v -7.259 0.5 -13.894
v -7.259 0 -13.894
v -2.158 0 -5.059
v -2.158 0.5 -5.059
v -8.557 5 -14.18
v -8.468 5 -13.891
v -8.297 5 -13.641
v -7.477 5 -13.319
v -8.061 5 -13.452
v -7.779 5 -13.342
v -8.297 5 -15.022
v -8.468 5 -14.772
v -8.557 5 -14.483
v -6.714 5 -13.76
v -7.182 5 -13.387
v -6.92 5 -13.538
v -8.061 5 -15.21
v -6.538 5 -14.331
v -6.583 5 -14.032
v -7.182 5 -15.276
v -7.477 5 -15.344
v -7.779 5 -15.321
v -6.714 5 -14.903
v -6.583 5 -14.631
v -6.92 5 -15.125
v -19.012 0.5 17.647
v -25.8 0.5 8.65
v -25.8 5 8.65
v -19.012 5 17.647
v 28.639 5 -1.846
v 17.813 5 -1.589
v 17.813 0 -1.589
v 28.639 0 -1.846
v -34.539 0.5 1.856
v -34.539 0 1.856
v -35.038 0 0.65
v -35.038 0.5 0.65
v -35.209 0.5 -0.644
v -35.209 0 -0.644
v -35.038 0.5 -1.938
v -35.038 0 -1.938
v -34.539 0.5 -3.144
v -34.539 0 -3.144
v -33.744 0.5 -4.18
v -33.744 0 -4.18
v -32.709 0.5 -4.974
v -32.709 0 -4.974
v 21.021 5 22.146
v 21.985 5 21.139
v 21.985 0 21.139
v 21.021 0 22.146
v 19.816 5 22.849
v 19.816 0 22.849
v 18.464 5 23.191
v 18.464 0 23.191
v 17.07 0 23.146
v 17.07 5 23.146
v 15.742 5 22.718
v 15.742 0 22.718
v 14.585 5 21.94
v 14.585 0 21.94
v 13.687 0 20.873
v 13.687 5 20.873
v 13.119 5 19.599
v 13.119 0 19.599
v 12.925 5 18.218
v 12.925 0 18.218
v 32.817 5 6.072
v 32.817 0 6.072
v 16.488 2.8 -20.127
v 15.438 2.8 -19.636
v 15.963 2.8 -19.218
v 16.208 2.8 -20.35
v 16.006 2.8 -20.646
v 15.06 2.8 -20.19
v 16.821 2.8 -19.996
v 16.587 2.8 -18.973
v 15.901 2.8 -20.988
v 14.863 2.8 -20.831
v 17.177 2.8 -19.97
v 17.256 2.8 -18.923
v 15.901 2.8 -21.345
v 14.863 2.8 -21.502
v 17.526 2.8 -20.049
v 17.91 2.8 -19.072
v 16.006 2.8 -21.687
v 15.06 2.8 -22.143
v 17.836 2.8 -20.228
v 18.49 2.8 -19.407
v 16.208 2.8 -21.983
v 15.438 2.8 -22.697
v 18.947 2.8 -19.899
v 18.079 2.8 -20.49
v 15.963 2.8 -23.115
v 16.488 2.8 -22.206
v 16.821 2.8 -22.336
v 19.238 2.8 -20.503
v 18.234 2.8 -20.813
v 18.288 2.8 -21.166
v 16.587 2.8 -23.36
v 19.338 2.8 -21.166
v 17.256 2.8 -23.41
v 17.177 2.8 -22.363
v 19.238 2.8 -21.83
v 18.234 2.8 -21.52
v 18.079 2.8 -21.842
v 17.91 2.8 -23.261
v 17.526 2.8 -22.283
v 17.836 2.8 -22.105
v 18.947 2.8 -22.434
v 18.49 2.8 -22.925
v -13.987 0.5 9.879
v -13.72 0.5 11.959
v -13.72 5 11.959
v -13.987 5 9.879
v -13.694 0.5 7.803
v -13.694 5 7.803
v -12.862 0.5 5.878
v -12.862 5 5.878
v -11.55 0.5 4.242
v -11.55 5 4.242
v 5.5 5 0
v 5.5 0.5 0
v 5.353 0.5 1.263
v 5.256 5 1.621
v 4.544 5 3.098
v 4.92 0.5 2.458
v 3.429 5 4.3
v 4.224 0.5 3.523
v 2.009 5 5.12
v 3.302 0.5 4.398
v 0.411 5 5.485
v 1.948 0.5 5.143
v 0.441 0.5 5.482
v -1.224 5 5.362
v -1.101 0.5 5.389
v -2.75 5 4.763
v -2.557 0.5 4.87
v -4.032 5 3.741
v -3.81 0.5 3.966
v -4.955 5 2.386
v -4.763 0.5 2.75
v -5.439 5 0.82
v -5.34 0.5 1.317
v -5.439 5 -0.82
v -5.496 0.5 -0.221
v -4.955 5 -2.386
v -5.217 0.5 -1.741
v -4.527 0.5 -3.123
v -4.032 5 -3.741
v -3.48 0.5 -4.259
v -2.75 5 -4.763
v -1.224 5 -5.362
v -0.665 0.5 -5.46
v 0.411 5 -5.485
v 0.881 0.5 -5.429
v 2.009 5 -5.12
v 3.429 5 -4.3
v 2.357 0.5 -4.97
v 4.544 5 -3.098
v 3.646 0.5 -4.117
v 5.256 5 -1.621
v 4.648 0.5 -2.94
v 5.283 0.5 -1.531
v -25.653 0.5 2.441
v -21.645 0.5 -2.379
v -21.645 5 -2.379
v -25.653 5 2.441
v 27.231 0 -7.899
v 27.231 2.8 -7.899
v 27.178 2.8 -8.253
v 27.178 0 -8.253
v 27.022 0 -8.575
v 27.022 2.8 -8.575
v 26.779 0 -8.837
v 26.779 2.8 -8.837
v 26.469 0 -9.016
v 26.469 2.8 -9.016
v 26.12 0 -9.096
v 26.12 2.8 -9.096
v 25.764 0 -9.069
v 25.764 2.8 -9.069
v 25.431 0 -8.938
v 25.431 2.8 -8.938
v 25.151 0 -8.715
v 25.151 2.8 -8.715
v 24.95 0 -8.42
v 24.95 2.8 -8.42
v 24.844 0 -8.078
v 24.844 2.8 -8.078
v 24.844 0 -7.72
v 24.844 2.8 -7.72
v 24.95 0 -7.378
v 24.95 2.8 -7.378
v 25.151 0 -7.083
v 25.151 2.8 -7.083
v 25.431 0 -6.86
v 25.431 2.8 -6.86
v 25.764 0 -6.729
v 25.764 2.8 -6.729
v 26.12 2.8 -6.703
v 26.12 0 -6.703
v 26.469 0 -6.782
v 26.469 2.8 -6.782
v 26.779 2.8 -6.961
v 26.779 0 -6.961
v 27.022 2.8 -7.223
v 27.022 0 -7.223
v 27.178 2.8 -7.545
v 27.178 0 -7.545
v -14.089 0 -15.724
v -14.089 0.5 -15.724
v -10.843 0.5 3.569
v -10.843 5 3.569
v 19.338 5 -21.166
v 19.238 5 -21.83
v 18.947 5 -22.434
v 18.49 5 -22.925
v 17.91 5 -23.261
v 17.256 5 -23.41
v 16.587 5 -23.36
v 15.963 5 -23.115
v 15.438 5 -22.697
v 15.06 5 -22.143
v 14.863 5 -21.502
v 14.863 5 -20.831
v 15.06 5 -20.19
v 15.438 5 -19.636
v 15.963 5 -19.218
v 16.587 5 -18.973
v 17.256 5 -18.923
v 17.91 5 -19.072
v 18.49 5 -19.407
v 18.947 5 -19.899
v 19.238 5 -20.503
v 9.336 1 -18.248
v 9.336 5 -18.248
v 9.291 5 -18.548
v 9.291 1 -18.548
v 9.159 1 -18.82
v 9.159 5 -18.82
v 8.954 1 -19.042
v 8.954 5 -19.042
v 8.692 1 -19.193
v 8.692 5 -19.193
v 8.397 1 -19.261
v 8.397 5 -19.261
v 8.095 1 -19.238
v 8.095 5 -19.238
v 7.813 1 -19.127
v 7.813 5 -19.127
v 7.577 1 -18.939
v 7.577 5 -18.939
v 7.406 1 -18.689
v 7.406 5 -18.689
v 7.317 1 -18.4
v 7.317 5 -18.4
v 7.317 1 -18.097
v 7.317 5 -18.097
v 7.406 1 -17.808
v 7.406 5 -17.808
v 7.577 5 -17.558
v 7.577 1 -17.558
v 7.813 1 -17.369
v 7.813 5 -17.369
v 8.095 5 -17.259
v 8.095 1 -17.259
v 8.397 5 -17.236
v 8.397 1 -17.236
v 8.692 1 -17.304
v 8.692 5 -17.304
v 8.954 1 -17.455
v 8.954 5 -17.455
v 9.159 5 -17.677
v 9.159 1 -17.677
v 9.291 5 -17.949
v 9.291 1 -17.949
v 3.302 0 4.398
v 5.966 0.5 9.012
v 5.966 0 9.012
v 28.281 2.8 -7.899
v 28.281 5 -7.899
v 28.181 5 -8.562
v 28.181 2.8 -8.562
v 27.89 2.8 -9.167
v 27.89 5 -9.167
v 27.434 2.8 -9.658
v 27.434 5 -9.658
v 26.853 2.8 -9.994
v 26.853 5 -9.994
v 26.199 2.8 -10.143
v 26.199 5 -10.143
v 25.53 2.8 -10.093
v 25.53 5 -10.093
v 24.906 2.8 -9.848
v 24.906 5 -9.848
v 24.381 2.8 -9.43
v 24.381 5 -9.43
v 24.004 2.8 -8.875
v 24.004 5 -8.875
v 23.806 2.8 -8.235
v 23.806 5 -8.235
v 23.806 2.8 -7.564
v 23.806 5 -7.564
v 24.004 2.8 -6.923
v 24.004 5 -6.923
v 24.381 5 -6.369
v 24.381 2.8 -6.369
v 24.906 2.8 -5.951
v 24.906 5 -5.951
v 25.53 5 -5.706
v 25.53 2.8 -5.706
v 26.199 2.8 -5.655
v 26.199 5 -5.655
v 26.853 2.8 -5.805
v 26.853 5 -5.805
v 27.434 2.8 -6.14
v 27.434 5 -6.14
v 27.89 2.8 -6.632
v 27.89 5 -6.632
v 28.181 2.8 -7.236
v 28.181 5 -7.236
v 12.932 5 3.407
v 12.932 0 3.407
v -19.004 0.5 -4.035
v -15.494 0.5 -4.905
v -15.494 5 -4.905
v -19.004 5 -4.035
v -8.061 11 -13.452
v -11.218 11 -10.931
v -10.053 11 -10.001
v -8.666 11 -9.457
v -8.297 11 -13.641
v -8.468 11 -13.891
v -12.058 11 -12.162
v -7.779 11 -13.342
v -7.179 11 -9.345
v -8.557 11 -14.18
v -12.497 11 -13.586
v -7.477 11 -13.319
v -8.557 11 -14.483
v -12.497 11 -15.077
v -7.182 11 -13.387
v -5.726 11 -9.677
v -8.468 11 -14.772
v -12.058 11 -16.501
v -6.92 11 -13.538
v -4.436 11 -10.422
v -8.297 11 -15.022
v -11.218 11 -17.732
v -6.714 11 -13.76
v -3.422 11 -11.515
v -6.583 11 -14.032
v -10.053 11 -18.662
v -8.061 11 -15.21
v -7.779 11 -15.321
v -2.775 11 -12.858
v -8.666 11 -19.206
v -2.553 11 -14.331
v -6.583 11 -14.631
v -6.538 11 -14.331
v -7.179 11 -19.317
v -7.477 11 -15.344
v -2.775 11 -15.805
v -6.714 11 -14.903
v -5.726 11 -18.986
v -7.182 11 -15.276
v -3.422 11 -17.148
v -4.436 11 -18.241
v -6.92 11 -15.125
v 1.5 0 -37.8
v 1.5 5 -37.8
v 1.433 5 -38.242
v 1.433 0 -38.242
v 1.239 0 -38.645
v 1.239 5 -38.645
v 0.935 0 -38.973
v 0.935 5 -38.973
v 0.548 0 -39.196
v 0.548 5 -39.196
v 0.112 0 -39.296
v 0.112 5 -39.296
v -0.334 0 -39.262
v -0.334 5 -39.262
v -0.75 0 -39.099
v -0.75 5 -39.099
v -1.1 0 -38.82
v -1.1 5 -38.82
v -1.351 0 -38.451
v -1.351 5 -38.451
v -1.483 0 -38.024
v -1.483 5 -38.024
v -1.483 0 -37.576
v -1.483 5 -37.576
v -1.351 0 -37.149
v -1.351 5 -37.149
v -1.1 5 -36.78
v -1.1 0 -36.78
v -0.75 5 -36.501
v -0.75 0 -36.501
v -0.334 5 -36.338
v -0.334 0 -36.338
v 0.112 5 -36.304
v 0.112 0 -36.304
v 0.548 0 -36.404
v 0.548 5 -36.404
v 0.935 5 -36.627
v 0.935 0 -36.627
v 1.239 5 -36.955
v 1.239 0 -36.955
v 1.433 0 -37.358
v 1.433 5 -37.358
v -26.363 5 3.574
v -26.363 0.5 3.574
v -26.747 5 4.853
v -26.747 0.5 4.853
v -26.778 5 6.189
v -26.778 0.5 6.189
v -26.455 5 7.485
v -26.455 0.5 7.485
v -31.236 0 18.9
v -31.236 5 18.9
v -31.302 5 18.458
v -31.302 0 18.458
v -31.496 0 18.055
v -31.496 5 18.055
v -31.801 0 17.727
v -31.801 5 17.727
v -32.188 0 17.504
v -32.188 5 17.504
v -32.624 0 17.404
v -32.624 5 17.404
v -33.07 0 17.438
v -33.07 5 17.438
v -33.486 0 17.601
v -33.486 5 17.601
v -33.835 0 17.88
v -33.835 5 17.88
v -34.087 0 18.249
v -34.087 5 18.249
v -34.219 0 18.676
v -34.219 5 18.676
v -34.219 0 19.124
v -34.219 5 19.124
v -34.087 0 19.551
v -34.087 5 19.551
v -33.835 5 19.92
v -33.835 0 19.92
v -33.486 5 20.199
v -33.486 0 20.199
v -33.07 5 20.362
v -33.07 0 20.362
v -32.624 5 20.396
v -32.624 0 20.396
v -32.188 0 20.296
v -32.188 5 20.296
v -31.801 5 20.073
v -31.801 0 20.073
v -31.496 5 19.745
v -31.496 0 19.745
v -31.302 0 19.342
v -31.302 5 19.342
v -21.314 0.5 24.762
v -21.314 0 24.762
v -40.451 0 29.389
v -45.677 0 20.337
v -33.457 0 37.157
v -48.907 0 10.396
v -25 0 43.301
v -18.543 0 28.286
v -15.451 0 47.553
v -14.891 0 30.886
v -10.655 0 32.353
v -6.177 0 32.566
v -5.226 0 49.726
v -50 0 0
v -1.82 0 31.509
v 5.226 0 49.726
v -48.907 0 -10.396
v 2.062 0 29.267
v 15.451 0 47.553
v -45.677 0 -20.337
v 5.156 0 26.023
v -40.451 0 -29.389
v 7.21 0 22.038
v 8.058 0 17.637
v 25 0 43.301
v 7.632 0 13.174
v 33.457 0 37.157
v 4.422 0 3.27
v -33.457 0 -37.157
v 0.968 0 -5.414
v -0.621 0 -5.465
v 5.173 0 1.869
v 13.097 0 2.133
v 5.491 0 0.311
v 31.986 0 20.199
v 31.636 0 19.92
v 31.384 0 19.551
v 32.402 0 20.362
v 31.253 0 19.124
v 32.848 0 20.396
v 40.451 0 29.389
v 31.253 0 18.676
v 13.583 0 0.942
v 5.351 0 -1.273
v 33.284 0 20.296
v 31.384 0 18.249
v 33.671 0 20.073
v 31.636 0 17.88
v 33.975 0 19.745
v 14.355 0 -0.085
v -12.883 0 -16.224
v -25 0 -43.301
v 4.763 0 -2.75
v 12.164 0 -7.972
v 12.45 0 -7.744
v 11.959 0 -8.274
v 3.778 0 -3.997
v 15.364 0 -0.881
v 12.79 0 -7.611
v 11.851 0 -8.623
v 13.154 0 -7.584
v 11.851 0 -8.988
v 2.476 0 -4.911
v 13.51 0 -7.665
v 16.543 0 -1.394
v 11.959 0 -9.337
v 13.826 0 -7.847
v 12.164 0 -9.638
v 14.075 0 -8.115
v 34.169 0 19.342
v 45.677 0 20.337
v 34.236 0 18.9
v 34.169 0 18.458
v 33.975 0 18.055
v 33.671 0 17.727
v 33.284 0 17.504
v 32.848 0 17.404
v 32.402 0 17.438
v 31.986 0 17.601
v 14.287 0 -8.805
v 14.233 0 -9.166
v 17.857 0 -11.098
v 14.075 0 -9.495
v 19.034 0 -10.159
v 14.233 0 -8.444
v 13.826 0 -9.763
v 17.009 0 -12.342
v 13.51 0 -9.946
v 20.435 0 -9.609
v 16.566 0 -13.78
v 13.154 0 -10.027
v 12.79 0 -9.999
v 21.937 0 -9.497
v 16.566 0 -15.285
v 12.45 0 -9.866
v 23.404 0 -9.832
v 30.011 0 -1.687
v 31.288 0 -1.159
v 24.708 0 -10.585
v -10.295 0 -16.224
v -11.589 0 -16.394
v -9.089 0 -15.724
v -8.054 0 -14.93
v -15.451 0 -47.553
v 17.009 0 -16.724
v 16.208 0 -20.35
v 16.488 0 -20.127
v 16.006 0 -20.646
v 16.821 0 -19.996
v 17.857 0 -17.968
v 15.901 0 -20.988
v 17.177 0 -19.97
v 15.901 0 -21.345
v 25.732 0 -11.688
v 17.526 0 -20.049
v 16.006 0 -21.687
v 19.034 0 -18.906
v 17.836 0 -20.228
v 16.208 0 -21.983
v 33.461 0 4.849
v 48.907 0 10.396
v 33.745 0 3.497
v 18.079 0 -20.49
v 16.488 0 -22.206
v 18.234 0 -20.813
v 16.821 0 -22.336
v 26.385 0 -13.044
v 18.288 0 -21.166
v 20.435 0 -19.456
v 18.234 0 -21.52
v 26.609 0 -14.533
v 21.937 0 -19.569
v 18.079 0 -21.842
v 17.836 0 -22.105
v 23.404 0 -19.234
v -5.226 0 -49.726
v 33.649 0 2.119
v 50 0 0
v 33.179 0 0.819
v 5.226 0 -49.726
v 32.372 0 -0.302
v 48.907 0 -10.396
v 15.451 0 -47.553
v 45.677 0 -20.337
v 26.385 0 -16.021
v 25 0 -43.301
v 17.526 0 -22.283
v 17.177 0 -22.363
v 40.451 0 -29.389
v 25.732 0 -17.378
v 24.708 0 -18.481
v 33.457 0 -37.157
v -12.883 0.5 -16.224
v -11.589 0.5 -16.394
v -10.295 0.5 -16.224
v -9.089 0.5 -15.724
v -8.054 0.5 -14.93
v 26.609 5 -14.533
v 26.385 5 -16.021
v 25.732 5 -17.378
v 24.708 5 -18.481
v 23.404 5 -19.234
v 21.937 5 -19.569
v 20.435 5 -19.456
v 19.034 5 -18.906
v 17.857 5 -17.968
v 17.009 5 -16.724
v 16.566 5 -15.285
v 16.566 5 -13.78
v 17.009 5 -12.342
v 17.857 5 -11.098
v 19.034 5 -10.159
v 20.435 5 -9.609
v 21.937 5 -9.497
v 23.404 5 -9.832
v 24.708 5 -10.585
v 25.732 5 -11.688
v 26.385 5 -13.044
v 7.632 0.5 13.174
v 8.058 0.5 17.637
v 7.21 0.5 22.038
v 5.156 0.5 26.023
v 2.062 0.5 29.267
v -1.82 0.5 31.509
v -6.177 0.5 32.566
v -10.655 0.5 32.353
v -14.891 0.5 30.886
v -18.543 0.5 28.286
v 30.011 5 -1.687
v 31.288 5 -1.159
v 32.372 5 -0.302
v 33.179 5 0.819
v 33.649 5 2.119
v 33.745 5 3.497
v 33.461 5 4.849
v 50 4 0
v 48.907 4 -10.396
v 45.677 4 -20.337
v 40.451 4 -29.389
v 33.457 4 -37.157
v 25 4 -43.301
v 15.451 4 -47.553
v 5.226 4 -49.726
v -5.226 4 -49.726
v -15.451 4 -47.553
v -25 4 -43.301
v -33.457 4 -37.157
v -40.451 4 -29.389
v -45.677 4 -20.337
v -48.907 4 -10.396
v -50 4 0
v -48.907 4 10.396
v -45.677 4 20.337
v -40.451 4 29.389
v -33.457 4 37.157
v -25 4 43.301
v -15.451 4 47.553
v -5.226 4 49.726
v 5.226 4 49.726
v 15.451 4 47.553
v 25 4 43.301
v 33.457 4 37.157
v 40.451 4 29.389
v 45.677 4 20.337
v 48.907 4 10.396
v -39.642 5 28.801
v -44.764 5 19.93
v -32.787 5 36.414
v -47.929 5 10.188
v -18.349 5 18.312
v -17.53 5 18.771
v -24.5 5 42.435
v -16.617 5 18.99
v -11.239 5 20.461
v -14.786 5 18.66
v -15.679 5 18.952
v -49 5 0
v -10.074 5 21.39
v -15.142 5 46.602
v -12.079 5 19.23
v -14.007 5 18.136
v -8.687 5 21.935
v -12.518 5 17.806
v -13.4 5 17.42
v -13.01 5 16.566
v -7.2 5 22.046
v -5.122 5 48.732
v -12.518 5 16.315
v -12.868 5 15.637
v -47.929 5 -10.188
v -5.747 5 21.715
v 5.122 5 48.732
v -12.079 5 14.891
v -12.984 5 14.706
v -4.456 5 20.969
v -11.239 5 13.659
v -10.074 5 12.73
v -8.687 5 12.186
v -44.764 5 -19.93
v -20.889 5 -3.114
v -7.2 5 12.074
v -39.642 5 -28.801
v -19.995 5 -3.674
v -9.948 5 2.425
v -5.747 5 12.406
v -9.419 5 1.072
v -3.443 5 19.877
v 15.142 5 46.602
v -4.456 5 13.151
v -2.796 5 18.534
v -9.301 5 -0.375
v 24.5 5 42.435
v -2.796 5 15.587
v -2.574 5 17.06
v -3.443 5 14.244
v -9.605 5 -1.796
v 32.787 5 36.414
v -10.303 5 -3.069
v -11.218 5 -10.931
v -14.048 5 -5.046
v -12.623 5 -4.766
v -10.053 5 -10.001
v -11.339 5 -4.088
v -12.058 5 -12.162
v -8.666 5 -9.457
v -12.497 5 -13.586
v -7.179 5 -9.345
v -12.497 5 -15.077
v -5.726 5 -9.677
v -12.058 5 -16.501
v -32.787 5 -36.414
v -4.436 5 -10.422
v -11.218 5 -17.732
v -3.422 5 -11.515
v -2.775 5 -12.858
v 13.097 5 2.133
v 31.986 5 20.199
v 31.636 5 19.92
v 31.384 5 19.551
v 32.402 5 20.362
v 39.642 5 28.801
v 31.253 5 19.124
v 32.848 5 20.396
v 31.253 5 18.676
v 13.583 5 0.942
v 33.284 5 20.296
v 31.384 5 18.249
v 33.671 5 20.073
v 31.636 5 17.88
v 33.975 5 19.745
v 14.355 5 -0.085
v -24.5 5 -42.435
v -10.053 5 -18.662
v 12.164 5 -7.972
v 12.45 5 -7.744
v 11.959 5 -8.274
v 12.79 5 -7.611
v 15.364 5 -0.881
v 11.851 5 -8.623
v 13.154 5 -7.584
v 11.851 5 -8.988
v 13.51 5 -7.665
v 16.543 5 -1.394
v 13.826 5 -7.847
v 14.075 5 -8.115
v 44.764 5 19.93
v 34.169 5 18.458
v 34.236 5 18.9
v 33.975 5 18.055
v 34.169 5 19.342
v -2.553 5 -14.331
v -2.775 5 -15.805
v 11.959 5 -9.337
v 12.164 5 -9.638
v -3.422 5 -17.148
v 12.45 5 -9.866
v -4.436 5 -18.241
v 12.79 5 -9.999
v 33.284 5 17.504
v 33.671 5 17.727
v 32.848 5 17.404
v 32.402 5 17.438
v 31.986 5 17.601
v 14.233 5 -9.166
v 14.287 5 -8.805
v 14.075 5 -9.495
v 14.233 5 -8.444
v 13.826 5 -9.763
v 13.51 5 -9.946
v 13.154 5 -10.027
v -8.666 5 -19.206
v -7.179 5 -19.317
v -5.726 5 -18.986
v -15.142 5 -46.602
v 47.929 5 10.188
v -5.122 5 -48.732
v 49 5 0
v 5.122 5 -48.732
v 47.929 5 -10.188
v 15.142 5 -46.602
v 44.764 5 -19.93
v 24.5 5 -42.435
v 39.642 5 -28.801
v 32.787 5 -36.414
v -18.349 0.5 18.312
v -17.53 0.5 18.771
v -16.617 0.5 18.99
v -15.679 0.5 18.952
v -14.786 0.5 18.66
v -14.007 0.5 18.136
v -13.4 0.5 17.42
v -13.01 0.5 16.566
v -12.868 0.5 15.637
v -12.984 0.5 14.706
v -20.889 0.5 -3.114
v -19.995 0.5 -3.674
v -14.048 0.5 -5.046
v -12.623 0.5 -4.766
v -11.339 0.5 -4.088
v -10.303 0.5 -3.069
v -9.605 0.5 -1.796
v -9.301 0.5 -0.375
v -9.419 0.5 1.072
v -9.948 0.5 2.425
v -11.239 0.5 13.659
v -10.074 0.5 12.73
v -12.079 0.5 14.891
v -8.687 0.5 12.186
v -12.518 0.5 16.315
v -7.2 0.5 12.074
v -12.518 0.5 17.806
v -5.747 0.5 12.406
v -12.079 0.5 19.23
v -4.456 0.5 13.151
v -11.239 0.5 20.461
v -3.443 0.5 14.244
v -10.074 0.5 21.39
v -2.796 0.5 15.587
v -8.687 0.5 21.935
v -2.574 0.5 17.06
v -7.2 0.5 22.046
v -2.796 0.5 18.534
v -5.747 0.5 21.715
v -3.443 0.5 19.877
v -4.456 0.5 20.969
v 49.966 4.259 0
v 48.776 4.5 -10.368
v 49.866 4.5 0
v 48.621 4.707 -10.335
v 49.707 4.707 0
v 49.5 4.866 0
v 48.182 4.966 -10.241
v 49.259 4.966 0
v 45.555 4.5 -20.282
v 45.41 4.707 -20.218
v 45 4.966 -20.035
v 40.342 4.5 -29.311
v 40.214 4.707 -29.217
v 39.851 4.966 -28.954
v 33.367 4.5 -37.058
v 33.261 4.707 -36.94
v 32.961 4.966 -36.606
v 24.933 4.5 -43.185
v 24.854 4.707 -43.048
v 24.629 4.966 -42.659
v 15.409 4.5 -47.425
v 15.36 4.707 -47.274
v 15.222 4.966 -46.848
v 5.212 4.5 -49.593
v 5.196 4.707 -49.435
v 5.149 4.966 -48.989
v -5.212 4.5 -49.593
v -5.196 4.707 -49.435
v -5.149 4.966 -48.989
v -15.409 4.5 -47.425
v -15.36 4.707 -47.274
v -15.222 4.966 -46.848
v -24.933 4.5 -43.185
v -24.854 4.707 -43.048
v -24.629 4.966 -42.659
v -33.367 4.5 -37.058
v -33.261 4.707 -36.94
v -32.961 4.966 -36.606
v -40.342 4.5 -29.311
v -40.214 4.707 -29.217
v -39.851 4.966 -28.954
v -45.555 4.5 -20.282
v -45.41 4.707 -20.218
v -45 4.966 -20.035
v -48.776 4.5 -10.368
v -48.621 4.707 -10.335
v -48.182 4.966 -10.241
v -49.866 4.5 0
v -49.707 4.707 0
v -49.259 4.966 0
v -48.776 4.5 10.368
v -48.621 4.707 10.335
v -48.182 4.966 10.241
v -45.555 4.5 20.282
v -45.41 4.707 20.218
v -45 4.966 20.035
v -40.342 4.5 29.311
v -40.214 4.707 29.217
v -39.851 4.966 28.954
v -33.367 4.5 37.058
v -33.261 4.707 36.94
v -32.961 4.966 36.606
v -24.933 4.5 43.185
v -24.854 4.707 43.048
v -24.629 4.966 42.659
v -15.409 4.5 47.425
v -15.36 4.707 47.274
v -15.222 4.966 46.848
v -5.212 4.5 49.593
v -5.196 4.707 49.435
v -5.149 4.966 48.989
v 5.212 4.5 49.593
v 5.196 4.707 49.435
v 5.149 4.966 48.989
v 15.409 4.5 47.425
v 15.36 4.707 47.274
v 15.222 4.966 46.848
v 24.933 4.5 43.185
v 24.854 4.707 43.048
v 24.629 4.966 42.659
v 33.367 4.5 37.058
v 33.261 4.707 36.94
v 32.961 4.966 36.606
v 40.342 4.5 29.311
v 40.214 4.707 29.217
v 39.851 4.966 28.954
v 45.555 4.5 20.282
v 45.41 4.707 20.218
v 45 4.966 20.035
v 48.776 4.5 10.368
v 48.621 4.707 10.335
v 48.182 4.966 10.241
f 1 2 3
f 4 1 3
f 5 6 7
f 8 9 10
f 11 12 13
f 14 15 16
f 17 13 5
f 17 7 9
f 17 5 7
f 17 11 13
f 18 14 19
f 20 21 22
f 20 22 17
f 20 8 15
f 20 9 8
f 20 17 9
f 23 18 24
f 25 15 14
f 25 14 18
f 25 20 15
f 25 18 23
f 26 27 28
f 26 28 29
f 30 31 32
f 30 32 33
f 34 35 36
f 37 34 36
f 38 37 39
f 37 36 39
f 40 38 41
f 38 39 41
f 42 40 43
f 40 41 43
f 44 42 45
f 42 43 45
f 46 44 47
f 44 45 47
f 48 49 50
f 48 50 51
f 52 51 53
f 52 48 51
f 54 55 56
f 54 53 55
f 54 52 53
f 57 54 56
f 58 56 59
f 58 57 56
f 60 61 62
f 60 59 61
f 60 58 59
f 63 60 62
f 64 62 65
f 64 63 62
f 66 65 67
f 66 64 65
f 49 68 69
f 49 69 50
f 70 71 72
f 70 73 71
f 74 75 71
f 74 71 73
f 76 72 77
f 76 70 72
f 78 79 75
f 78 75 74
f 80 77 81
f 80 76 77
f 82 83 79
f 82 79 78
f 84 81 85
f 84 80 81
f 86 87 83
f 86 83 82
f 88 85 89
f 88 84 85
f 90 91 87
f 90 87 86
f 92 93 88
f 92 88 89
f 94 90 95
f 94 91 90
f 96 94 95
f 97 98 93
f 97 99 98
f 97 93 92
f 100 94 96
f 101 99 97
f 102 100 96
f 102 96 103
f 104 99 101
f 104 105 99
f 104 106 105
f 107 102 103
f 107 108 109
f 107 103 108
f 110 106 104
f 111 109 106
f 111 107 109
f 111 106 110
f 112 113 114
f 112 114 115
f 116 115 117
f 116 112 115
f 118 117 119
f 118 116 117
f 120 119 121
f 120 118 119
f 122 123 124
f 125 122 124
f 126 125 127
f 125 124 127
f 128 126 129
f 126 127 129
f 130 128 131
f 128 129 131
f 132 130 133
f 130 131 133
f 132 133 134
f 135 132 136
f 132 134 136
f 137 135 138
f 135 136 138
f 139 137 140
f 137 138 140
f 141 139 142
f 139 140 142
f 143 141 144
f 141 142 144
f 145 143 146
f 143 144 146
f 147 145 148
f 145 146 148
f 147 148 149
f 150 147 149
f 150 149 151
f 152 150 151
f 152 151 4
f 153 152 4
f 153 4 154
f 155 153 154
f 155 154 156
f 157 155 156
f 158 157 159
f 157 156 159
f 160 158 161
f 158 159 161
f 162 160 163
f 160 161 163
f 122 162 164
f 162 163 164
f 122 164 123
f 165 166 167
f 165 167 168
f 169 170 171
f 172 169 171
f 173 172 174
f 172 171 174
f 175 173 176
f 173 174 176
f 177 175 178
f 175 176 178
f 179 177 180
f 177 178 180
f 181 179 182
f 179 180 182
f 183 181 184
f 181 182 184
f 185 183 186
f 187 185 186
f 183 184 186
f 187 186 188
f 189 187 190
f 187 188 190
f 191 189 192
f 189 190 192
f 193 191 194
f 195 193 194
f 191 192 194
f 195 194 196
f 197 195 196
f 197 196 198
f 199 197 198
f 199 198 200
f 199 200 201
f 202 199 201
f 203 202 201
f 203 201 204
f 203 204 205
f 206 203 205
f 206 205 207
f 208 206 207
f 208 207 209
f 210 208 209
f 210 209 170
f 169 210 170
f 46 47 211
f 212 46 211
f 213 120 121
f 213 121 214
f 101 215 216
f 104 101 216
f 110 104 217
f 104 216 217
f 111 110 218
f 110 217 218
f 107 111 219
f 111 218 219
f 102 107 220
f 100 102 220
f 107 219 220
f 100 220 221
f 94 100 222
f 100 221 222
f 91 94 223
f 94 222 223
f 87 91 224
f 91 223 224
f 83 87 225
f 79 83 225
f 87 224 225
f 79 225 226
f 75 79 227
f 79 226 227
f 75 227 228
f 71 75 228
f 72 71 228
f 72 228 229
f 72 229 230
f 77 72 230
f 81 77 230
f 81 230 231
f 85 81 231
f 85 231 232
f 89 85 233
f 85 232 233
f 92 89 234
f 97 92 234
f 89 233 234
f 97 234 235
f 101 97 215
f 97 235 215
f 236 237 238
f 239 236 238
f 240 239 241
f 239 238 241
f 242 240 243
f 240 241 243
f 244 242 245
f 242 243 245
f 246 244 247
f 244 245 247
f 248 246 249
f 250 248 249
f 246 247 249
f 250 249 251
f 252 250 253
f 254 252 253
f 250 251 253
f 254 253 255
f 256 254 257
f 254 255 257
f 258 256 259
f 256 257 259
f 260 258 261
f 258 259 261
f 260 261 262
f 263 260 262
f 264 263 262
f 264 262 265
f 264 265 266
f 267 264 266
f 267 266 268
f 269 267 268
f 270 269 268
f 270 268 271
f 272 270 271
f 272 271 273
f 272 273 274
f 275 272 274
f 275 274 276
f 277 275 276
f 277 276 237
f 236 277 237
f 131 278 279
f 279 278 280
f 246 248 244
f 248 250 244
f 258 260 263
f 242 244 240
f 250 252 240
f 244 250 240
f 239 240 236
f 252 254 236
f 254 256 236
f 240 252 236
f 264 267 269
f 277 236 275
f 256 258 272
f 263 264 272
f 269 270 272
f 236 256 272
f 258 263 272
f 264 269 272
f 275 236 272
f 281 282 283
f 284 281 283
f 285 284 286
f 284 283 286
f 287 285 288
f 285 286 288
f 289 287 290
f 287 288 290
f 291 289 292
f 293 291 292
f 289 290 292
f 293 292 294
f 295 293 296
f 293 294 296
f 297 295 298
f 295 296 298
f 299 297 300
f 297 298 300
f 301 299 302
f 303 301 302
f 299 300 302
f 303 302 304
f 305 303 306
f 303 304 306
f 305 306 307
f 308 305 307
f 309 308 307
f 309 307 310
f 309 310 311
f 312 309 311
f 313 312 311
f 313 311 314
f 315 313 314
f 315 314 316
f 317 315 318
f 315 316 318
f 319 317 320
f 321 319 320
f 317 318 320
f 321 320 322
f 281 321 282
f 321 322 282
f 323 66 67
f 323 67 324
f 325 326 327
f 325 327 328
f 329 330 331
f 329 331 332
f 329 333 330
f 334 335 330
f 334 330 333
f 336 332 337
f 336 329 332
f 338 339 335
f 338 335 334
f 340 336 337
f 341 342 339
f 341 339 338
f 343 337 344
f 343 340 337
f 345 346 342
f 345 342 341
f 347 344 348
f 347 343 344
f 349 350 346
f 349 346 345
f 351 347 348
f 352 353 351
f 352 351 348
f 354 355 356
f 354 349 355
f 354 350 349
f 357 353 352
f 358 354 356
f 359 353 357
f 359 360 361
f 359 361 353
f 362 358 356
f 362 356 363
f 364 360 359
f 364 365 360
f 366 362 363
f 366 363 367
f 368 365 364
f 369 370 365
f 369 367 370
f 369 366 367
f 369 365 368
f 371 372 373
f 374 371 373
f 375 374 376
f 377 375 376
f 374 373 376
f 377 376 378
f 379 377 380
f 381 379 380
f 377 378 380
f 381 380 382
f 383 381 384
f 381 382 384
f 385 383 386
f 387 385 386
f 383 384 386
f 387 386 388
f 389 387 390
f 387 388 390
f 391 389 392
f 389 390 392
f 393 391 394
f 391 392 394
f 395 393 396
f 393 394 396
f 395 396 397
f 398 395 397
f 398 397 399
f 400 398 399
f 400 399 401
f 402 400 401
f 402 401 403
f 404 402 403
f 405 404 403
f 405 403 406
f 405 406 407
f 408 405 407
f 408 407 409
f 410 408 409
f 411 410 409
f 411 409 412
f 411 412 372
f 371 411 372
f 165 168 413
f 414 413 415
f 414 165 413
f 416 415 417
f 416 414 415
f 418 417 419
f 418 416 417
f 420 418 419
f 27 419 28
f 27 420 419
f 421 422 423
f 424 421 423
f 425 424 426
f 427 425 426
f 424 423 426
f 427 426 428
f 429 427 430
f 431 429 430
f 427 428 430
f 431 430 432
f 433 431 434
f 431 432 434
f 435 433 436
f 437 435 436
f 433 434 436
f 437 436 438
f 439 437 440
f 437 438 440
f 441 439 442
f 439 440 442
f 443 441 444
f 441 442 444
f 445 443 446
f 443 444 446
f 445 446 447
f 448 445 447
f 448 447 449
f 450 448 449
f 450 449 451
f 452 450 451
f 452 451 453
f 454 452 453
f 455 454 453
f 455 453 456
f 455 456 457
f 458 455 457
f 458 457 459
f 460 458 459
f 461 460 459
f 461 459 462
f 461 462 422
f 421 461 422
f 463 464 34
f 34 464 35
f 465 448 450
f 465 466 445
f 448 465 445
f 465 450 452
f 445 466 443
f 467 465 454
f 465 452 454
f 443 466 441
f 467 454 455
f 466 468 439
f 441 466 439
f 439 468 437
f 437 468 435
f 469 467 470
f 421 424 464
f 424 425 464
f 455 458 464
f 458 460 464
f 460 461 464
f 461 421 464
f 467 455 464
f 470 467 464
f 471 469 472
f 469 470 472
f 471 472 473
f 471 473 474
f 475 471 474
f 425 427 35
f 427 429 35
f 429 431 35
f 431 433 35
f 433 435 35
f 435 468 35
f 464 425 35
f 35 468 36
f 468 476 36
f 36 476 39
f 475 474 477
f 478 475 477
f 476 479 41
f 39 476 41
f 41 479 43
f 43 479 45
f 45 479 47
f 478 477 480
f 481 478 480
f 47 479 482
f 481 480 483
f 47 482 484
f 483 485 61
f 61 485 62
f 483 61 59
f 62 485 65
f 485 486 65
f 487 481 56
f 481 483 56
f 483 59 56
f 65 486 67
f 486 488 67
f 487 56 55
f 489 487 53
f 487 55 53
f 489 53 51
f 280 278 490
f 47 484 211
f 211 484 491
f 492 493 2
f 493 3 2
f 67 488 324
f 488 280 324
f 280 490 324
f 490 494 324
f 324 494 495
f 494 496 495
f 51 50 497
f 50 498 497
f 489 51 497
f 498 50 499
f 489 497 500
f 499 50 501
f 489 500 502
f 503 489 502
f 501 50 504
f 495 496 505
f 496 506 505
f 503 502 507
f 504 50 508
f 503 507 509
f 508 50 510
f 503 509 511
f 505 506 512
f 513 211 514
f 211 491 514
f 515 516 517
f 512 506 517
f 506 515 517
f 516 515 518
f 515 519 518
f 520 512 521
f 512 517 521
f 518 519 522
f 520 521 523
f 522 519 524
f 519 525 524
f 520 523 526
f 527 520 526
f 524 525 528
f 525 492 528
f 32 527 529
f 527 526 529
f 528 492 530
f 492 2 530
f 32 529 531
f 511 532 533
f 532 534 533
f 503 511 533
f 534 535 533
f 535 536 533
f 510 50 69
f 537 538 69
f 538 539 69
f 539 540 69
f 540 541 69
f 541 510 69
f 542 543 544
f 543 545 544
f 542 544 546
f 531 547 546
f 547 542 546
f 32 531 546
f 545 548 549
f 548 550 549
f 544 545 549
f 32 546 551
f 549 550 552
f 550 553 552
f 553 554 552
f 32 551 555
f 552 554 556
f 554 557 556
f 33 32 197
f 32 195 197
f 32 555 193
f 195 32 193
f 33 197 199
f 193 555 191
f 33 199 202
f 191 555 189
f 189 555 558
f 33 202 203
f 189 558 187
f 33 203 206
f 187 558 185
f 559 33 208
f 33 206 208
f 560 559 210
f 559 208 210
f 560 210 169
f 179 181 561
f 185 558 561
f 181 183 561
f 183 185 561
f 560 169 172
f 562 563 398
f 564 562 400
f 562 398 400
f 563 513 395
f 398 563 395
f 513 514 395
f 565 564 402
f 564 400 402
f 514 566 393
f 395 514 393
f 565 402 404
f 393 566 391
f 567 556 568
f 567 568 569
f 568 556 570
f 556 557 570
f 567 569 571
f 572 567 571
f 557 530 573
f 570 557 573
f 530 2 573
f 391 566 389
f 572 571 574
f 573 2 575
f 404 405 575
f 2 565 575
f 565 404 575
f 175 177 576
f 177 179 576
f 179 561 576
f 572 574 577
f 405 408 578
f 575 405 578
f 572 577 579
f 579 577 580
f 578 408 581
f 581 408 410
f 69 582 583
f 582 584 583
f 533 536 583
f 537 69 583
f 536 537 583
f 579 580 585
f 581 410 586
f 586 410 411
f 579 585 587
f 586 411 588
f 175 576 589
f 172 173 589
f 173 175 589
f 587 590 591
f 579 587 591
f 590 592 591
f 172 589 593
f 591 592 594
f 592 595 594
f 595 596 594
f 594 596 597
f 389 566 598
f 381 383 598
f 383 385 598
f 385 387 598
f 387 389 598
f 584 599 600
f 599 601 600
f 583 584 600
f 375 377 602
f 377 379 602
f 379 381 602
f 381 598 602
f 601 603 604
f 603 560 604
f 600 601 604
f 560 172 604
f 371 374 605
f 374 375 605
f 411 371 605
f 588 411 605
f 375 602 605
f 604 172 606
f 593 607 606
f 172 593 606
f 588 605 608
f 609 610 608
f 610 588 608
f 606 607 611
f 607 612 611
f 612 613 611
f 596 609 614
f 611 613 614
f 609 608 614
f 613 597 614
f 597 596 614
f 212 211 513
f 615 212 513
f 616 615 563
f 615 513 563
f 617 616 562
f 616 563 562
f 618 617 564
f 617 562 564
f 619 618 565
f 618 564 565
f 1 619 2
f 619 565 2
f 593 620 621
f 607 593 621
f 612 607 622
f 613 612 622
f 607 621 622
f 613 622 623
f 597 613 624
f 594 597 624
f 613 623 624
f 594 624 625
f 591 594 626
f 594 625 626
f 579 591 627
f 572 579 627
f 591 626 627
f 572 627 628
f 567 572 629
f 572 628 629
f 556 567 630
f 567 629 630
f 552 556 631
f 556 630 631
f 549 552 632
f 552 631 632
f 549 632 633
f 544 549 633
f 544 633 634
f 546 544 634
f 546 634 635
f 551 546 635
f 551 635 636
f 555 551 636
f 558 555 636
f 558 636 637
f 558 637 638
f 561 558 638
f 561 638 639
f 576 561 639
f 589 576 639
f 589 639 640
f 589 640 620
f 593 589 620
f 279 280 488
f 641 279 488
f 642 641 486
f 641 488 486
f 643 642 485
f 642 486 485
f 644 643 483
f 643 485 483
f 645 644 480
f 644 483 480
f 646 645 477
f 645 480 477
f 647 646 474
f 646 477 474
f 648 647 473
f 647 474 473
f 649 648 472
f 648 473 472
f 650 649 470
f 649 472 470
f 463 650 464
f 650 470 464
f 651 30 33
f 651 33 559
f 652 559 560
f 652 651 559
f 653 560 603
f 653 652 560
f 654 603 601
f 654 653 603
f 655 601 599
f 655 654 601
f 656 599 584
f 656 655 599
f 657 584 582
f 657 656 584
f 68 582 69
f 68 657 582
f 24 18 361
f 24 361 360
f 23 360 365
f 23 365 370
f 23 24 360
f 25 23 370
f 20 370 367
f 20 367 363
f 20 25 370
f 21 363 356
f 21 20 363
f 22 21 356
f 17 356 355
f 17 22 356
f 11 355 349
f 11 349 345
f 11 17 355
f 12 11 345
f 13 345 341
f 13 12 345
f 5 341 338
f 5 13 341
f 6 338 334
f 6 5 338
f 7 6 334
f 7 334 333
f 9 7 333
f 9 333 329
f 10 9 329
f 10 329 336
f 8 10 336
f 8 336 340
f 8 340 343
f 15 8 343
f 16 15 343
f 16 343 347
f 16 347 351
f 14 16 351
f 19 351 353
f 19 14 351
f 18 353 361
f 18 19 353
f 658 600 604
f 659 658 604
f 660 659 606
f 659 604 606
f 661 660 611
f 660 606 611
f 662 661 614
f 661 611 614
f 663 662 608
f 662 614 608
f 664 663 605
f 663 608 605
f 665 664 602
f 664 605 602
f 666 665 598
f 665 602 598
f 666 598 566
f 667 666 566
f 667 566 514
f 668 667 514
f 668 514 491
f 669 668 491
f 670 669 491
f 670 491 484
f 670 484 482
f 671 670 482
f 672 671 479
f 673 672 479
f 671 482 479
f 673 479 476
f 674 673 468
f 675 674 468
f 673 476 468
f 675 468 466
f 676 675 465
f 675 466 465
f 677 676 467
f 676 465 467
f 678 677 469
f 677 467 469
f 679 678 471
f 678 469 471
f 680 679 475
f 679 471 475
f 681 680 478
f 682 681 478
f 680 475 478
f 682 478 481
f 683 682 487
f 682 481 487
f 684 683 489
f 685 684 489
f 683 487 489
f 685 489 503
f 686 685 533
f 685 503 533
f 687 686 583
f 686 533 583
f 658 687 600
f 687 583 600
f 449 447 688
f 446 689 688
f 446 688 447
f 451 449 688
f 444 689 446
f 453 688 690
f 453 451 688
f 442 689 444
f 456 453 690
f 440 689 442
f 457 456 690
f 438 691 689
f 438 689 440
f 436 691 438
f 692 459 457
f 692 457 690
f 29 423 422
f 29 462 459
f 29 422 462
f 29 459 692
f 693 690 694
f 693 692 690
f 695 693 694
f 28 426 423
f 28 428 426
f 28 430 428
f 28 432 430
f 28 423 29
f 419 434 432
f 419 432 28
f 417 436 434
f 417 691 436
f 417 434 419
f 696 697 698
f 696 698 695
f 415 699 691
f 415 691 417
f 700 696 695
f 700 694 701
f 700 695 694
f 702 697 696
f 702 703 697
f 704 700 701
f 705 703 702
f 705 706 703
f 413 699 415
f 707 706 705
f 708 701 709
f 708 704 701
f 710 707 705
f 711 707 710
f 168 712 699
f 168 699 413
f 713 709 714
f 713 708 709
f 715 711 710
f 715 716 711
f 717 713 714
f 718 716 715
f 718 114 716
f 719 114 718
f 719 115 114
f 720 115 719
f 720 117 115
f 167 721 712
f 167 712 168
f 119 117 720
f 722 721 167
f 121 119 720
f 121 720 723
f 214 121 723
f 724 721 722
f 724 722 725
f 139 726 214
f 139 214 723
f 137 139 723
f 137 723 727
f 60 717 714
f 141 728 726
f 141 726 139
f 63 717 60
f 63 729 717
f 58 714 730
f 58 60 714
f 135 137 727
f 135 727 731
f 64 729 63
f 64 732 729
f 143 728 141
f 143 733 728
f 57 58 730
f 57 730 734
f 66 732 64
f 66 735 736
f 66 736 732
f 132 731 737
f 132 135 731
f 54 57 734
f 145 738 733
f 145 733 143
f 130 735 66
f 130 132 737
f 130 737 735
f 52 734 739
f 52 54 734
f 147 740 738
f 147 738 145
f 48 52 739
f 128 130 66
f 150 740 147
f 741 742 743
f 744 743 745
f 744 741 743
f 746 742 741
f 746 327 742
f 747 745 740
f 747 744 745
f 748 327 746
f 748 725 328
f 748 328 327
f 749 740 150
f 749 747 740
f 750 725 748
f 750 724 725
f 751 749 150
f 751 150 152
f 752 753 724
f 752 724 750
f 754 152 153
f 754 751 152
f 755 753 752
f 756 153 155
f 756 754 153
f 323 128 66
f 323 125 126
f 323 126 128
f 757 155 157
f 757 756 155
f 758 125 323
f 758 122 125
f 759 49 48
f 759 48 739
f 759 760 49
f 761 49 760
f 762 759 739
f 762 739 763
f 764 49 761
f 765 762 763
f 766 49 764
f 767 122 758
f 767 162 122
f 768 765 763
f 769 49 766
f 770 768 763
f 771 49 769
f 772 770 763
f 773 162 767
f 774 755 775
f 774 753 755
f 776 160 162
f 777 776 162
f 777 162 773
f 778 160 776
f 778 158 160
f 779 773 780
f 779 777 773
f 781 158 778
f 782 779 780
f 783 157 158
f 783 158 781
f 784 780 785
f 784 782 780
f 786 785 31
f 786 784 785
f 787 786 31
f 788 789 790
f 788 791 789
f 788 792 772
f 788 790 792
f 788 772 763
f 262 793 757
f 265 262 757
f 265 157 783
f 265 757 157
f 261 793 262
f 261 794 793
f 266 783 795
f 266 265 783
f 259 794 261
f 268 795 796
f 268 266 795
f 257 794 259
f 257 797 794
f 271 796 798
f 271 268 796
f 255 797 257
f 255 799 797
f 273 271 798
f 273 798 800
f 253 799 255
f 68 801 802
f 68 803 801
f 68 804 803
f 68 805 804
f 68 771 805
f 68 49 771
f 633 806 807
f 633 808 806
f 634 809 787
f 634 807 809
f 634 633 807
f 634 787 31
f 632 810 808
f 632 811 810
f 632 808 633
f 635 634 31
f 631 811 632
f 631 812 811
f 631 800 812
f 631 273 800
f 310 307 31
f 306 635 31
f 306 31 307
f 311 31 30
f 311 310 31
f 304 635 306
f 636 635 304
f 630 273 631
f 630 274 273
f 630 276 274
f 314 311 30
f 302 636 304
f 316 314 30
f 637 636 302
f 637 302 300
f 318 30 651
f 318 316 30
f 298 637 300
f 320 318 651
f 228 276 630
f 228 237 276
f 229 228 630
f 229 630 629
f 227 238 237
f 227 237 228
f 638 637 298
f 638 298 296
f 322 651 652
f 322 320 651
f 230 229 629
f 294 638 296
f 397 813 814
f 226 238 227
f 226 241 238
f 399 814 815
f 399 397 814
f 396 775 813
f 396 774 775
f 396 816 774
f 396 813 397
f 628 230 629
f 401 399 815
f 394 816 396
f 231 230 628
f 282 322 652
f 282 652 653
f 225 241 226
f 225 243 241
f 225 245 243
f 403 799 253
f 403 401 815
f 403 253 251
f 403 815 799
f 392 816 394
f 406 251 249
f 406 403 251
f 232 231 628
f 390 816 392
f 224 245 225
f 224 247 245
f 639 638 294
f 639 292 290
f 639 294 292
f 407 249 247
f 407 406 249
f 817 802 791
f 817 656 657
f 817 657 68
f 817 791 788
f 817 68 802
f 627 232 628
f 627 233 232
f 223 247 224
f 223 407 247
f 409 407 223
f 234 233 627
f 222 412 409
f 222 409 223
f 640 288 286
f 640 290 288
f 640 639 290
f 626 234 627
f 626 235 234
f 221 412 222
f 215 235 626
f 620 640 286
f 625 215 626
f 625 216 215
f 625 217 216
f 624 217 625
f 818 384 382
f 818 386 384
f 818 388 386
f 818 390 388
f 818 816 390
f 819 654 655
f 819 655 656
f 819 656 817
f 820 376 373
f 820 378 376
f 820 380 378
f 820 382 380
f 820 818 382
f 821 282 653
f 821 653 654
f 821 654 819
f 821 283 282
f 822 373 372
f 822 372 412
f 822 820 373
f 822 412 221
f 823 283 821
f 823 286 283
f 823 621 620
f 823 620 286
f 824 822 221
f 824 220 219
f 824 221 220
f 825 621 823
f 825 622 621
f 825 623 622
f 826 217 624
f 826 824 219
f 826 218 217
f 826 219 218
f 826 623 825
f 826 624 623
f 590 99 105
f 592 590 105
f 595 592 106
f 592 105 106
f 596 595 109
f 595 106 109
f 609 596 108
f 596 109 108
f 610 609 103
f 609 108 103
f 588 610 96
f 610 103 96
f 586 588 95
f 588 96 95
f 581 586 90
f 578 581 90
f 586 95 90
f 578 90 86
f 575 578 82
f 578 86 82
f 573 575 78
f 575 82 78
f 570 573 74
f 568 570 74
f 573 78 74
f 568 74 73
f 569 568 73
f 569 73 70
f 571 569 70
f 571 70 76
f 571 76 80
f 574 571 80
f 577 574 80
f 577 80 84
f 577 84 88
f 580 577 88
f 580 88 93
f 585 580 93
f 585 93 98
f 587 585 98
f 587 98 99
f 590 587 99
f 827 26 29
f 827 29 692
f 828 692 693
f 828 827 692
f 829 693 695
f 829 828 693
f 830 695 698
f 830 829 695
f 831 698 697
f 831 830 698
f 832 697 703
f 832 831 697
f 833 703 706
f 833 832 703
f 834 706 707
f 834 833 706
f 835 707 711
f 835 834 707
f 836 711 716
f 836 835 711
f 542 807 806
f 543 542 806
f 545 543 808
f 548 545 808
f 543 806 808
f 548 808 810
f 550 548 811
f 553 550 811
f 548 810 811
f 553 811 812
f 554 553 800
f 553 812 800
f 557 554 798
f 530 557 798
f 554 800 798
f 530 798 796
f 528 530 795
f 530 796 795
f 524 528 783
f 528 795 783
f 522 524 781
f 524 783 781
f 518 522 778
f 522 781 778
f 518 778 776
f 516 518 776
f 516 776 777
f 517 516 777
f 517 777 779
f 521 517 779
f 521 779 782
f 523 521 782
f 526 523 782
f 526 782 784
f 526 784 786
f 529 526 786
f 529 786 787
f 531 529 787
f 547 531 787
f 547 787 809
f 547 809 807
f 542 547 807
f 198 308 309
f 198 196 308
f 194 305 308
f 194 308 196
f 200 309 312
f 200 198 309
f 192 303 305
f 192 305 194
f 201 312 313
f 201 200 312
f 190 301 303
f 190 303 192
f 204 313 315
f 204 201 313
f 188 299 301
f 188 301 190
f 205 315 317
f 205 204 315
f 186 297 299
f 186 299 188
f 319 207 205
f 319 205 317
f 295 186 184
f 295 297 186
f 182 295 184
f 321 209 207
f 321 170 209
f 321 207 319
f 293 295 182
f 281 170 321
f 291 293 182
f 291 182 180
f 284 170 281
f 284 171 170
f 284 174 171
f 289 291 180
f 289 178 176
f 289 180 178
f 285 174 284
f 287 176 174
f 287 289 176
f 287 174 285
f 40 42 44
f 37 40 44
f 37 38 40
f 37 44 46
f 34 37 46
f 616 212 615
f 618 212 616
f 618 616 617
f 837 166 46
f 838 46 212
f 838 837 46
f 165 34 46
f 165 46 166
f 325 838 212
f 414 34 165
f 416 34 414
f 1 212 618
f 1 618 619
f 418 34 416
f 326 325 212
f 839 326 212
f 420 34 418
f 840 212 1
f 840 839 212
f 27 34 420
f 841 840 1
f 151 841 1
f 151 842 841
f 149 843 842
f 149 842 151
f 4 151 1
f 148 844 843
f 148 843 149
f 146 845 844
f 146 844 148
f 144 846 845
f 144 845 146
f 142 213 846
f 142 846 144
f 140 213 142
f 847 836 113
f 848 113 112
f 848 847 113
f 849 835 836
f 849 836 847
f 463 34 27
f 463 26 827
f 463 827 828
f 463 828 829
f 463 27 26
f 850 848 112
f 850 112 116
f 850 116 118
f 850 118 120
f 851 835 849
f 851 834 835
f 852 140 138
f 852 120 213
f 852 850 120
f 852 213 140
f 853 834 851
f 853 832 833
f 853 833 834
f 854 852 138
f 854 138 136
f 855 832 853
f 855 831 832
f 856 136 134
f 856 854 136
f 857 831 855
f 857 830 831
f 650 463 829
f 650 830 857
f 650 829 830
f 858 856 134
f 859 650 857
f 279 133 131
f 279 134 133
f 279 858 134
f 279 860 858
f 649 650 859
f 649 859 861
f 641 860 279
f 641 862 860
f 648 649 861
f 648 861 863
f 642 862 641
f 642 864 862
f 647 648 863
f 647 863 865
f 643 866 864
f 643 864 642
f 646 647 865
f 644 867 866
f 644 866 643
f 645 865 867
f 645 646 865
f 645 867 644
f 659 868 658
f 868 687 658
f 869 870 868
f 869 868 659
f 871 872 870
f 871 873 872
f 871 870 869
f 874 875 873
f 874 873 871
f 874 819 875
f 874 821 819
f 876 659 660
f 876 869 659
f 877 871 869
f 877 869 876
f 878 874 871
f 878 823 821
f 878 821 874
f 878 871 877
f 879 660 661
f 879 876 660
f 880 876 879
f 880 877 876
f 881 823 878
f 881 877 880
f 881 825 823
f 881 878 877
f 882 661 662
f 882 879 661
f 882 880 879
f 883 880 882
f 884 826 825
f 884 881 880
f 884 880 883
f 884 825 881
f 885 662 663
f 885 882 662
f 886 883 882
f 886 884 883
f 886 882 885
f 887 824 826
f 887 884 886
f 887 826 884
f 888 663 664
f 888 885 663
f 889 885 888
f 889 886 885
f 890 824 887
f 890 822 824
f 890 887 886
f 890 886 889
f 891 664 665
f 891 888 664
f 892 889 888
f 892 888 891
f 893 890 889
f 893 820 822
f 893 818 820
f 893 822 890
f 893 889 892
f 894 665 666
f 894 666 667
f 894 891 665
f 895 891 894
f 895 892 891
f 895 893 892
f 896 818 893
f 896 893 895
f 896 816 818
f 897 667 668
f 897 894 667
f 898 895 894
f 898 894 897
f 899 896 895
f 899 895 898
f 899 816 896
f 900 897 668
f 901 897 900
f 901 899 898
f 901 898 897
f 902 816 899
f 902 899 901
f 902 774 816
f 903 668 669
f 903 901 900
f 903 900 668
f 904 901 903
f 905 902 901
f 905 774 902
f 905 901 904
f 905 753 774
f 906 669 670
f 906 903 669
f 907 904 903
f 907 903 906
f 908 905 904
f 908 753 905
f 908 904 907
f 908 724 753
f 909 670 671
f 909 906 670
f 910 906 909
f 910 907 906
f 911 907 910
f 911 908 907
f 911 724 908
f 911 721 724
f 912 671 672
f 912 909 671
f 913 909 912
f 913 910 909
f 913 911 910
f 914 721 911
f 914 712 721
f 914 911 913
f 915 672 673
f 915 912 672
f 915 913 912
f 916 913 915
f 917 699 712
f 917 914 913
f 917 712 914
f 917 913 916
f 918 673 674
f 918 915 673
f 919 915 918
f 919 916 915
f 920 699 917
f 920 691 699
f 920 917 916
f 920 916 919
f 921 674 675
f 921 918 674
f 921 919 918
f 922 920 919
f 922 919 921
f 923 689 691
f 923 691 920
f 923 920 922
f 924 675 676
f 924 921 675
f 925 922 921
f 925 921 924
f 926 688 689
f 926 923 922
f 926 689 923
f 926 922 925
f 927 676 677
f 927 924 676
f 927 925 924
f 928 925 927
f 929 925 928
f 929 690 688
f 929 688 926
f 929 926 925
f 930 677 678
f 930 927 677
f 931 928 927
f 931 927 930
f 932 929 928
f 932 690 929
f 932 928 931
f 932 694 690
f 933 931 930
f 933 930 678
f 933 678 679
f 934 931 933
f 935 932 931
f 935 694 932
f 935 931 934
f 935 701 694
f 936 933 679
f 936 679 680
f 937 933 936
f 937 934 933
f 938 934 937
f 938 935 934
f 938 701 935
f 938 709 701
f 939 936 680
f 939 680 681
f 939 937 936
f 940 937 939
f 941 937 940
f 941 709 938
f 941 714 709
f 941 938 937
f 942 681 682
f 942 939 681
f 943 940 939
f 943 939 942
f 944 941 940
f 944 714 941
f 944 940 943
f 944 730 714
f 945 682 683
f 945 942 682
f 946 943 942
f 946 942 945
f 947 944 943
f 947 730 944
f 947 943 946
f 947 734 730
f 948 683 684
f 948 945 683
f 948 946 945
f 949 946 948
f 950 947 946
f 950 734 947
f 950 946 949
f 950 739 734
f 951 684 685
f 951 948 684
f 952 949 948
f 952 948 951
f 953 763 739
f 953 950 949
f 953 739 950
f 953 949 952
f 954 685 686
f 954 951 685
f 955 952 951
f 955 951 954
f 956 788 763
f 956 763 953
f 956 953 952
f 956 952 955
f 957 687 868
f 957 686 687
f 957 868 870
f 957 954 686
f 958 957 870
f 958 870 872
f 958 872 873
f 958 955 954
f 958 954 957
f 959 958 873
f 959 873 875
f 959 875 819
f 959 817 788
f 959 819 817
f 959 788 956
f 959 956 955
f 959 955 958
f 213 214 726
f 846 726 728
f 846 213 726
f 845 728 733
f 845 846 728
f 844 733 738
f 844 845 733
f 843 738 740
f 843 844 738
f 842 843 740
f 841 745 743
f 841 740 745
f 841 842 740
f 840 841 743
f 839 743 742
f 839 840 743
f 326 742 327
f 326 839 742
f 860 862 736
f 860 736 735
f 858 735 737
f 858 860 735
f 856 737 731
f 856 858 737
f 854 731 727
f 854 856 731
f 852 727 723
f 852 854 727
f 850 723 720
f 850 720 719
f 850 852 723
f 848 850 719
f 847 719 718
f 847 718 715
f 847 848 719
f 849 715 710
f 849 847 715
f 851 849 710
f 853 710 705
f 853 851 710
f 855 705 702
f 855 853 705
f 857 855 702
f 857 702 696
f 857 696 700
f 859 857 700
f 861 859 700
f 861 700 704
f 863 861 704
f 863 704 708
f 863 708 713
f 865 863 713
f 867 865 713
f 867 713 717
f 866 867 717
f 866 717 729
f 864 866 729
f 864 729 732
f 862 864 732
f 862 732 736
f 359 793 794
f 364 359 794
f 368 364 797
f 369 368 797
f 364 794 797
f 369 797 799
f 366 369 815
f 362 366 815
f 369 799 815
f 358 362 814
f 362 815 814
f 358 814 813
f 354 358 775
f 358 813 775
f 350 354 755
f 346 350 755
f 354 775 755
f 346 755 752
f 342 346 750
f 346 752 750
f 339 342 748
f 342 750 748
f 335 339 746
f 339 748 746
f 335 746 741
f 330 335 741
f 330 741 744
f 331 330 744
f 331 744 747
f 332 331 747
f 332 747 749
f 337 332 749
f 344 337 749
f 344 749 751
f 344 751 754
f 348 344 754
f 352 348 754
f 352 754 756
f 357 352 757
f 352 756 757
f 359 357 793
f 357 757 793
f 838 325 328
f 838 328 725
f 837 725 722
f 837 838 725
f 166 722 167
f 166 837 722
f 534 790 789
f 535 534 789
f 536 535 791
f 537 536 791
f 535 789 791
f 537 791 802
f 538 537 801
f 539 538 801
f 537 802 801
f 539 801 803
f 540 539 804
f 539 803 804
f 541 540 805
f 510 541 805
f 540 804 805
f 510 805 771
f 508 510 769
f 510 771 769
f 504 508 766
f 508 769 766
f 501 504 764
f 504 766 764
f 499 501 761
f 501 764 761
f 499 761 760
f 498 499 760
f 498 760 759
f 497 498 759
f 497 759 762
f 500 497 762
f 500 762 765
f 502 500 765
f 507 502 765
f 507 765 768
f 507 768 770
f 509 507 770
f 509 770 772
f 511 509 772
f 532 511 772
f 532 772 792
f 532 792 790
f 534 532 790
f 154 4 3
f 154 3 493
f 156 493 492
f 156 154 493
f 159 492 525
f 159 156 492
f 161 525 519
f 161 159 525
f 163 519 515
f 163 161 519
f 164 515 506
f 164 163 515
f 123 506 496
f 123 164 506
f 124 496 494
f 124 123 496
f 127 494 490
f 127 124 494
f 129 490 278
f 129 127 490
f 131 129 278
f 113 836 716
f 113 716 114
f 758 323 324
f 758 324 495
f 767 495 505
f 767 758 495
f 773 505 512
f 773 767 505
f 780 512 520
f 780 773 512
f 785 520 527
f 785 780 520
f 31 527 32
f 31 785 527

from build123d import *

# Parameters (mm, degrees)
SKETCH1_R                = 50
SKETCH1_R_2              = 5
BOSS_EXTRUDE1_DEPTH      = 5
SKETCH2_R                = 1.2
SKETCH2_R_2              = 1.225
SKETCH2_R_3              = 5.05
SKETCH2_R_4              = 1.015
CUT_EXTRUDE1_DEPTH       = 10
SKETCH5_R                = 5
SKETCH5_R_2              = 1.015
BOSS_EXTRUDE2_DEPTH      = 6
SKETCH9_R                = 2.357259082
BOSS_EXTRUDE4_DEPTH      = 1
FILLET1_R                = 1
SKETCH10_R               = 1.5
CUT_EXTRUDE3_DEPTH       = 2.2
CUT_EXTRUDE3_DEPTH_BACK  = 16
CUT_EXTRUDE6_DEPTH       = 0.5
CUT_EXTRUDE7_DEPTH       = 10
CUT_EXTRUDE9_DEPTH       = 10
CUT_EXTRUDE9_DEPTH_BACK  = 10
SKETCH17_R               = 5.5
CUT_EXTRUDE10_DEPTH      = 10
CUT_EXTRUDE10_DEPTH_BACK = 10
SKETCH18_R               = 2.25
CUT_EXTRUDE11_DEPTH      = 2.2


with BuildPart() as part:
    # Sketch1 → Boss-Extrude1 (new body)
    with BuildSketch(Plane(origin=(0, 0, 0), x_dir=(1, 0, 0), z_dir=(0, 1, 0))):
        Circle(SKETCH1_R)
        with Locations((-7.573934673, -17.06033615)):
            Circle(SKETCH1_R_2, mode=Mode.SUBTRACT)
    extrude(amount=BOSS_EXTRUDE1_DEPTH)

    # Sketch2 → Cut-Extrude1 (cut)
    with BuildSketch(Plane(origin=(0, 5, 0), x_dir=(1, 0, 0), z_dir=(0, 1, 0))):
        with Locations((26.030814012, 7.899159566)):
            Circle(SKETCH2_R)
        with Locations((17.087578103, 21.16635714)):
            Circle(SKETCH2_R)
        with Locations((13.062426036, 8.805202225)):
            Circle(SKETCH2_R_2)
        with Locations((21.559196058, 14.532758353)):
            Circle(SKETCH2_R_3)
        with Locations((8.320757608, 18.248434254)):
            Circle(SKETCH2_R_4)
    extrude(amount=-CUT_EXTRUDE1_DEPTH, mode=Mode.SUBTRACT)

    # Sketch5 → Boss-Extrude2 (add)
    with BuildSketch(Plane(origin=(0, 5, 0), x_dir=(1, 0, 0), z_dir=(0, 1, 0))):
        with Locations((-7.55311225, 14.331451264)):
            Circle(SKETCH5_R)
        with Locations((-7.55311225, 14.331451264)):
            Circle(SKETCH5_R_2, mode=Mode.SUBTRACT)
    extrude(amount=BOSS_EXTRUDE2_DEPTH)

    # Sketch9 → Boss-Extrude4 (add)
    with BuildSketch(Plane.XZ):
        with Locations((8.320757608, -18.248434254)):
            Circle(SKETCH9_R)
    extrude(amount=-BOSS_EXTRUDE4_DEPTH)

    # Fillet1
    fillet1_edges = [part.edges().sort_by_distance(p)[0] for p in [
        (-50, 5, 0),
    ]]
    fillet(fillet1_edges, radius=FILLET1_R)

    # Sketch10 → Cut-Extrude3 (cut, two sides)
    with BuildSketch(Plane(origin=(0, 5, 0), x_dir=(1, 0, 0), z_dir=(0, 1, 0))) as cut_extrude3_sk:
        with Locations((0, 37.8)):
            Circle(SKETCH10_R)
        with Locations((-32.735760263, -18.9)):
            Circle(SKETCH10_R)
        with Locations((32.735760263, -18.9)):
            Circle(SKETCH10_R)
    extrude(amount=CUT_EXTRUDE3_DEPTH, mode=Mode.SUBTRACT)
    extrude(cut_extrude3_sk.sketch, amount=-CUT_EXTRUDE3_DEPTH_BACK, mode=Mode.SUBTRACT)

    # Sketch12 → Cut-Extrude6 (cut)
    with BuildSketch(Plane.XZ):
        with BuildLine():
            Line((-21.313834783, 24.76213107), (-34.538834783, 1.855759139))
            ThreePointArc((-34.538834783, 1.855759139), (-35.038336896, -1.938336086), (-32.708707764, -4.974367879))
            Line((-32.708707764, -4.974367879), (-14.089161583, -15.724367879))
            ThreePointArc((-14.089161583, -15.724367879), (-10.295066357, -16.223869992), (-7.259034564, -13.894240861))
            Line((-7.259034564, -13.894240861), (5.965965436, 9.01213107))
            ThreePointArc((5.965965436, 9.01213107), (0.201065327, 30.527031179), (-21.313834783, 24.76213107))
        make_face()
    extrude(amount=-CUT_EXTRUDE6_DEPTH, mode=Mode.SUBTRACT)

    # Sketch13 → Cut-Extrude7 (cut)
    with BuildSketch(Plane(origin=(0, 5, 0), x_dir=(1, 0, 0), z_dir=(0, 1, 0))):
        with BuildLine():
            Line((32.816836472, -6.07169605), (21.984996749, -21.138640776))
            ThreePointArc((21.984996749, -21.138640776), (16.391033491, -22.978825985), (12.925236211, -18.21784334))
            Line((12.925236211, -18.21784334), (12.931687147, -3.407234286))
            ThreePointArc((12.931687147, -3.407234286), (14.35531099, 0.084802692), (17.813324255, 1.589186743))
            Line((17.813324255, 1.589186743), (28.638713042, 1.845522414))
            ThreePointArc((28.638713042, 1.845522414), (33.179093412, -0.819461796), (32.816836472, -6.07169605))
        make_face()
    extrude(amount=-CUT_EXTRUDE7_DEPTH, mode=Mode.SUBTRACT)

    # Sketch16 → Cut-Extrude9 (cut, two sides)
    with BuildSketch(Plane.XZ.offset(-0.5)) as cut_extrude9_sk:
        with BuildLine():
            Line((-12.984156175, 14.705600426), (-13.719701132, 11.95882482))
            ThreePointArc((-13.719701132, 11.95882482), (-13.693758532, 7.802544191), (-11.54963643, 4.241914739))
            Line((-11.54963643, 4.241914739), (-10.842839117, 3.568938111))
            ThreePointArc((-10.842839117, 3.568938111), (-9.907482144, -2.457917187), (-15.493944375, -4.905225341))
            Line((-15.493944375, -4.905225341), (-19.004093622, -4.034917019))
            ThreePointArc((-19.004093622, -4.034917019), (-20.457115896, -3.417911536), (-21.645362284, -2.3786618))
            Line((-21.645362284, -2.3786618), (-25.653320737, 2.441392154))
            ThreePointArc((-25.653320737, 2.441392154), (-26.807383132, 5.519886283), (-25.80025353, 8.649531003))
            Line((-25.80025353, 8.649531003), (-19.012059198, 17.647148968))
            ThreePointArc((-19.012059198, 17.647148968), (-14.786139745, 18.659973084), (-12.984156175, 14.705600426))
        make_face()
    extrude(amount=CUT_EXTRUDE9_DEPTH, mode=Mode.SUBTRACT)
    extrude(cut_extrude9_sk.sketch, amount=-CUT_EXTRUDE9_DEPTH_BACK, mode=Mode.SUBTRACT)

    # Sketch17 → Cut-Extrude10 (cut, two sides)
    with BuildSketch(Plane.XZ.offset(-0.5)) as cut_extrude10_sk:
        Circle(SKETCH17_R)
    extrude(amount=CUT_EXTRUDE10_DEPTH, mode=Mode.SUBTRACT)
    extrude(cut_extrude10_sk.sketch, amount=-CUT_EXTRUDE10_DEPTH_BACK, mode=Mode.SUBTRACT)

    # Sketch18 → Cut-Extrude11 (cut)
    with BuildSketch(Plane(origin=(0, 5, 0), x_dir=(1, 0, 0), z_dir=(0, 1, 0))):
        with Locations((17.087578103, 21.16635714)):
            Circle(SKETCH18_R)
        with Locations((26.030814012, 7.899159566)):
            Circle(SKETCH18_R)
    extrude(amount=-CUT_EXTRUDE11_DEPTH, mode=Mode.SUBTRACT)


solid = part.part
